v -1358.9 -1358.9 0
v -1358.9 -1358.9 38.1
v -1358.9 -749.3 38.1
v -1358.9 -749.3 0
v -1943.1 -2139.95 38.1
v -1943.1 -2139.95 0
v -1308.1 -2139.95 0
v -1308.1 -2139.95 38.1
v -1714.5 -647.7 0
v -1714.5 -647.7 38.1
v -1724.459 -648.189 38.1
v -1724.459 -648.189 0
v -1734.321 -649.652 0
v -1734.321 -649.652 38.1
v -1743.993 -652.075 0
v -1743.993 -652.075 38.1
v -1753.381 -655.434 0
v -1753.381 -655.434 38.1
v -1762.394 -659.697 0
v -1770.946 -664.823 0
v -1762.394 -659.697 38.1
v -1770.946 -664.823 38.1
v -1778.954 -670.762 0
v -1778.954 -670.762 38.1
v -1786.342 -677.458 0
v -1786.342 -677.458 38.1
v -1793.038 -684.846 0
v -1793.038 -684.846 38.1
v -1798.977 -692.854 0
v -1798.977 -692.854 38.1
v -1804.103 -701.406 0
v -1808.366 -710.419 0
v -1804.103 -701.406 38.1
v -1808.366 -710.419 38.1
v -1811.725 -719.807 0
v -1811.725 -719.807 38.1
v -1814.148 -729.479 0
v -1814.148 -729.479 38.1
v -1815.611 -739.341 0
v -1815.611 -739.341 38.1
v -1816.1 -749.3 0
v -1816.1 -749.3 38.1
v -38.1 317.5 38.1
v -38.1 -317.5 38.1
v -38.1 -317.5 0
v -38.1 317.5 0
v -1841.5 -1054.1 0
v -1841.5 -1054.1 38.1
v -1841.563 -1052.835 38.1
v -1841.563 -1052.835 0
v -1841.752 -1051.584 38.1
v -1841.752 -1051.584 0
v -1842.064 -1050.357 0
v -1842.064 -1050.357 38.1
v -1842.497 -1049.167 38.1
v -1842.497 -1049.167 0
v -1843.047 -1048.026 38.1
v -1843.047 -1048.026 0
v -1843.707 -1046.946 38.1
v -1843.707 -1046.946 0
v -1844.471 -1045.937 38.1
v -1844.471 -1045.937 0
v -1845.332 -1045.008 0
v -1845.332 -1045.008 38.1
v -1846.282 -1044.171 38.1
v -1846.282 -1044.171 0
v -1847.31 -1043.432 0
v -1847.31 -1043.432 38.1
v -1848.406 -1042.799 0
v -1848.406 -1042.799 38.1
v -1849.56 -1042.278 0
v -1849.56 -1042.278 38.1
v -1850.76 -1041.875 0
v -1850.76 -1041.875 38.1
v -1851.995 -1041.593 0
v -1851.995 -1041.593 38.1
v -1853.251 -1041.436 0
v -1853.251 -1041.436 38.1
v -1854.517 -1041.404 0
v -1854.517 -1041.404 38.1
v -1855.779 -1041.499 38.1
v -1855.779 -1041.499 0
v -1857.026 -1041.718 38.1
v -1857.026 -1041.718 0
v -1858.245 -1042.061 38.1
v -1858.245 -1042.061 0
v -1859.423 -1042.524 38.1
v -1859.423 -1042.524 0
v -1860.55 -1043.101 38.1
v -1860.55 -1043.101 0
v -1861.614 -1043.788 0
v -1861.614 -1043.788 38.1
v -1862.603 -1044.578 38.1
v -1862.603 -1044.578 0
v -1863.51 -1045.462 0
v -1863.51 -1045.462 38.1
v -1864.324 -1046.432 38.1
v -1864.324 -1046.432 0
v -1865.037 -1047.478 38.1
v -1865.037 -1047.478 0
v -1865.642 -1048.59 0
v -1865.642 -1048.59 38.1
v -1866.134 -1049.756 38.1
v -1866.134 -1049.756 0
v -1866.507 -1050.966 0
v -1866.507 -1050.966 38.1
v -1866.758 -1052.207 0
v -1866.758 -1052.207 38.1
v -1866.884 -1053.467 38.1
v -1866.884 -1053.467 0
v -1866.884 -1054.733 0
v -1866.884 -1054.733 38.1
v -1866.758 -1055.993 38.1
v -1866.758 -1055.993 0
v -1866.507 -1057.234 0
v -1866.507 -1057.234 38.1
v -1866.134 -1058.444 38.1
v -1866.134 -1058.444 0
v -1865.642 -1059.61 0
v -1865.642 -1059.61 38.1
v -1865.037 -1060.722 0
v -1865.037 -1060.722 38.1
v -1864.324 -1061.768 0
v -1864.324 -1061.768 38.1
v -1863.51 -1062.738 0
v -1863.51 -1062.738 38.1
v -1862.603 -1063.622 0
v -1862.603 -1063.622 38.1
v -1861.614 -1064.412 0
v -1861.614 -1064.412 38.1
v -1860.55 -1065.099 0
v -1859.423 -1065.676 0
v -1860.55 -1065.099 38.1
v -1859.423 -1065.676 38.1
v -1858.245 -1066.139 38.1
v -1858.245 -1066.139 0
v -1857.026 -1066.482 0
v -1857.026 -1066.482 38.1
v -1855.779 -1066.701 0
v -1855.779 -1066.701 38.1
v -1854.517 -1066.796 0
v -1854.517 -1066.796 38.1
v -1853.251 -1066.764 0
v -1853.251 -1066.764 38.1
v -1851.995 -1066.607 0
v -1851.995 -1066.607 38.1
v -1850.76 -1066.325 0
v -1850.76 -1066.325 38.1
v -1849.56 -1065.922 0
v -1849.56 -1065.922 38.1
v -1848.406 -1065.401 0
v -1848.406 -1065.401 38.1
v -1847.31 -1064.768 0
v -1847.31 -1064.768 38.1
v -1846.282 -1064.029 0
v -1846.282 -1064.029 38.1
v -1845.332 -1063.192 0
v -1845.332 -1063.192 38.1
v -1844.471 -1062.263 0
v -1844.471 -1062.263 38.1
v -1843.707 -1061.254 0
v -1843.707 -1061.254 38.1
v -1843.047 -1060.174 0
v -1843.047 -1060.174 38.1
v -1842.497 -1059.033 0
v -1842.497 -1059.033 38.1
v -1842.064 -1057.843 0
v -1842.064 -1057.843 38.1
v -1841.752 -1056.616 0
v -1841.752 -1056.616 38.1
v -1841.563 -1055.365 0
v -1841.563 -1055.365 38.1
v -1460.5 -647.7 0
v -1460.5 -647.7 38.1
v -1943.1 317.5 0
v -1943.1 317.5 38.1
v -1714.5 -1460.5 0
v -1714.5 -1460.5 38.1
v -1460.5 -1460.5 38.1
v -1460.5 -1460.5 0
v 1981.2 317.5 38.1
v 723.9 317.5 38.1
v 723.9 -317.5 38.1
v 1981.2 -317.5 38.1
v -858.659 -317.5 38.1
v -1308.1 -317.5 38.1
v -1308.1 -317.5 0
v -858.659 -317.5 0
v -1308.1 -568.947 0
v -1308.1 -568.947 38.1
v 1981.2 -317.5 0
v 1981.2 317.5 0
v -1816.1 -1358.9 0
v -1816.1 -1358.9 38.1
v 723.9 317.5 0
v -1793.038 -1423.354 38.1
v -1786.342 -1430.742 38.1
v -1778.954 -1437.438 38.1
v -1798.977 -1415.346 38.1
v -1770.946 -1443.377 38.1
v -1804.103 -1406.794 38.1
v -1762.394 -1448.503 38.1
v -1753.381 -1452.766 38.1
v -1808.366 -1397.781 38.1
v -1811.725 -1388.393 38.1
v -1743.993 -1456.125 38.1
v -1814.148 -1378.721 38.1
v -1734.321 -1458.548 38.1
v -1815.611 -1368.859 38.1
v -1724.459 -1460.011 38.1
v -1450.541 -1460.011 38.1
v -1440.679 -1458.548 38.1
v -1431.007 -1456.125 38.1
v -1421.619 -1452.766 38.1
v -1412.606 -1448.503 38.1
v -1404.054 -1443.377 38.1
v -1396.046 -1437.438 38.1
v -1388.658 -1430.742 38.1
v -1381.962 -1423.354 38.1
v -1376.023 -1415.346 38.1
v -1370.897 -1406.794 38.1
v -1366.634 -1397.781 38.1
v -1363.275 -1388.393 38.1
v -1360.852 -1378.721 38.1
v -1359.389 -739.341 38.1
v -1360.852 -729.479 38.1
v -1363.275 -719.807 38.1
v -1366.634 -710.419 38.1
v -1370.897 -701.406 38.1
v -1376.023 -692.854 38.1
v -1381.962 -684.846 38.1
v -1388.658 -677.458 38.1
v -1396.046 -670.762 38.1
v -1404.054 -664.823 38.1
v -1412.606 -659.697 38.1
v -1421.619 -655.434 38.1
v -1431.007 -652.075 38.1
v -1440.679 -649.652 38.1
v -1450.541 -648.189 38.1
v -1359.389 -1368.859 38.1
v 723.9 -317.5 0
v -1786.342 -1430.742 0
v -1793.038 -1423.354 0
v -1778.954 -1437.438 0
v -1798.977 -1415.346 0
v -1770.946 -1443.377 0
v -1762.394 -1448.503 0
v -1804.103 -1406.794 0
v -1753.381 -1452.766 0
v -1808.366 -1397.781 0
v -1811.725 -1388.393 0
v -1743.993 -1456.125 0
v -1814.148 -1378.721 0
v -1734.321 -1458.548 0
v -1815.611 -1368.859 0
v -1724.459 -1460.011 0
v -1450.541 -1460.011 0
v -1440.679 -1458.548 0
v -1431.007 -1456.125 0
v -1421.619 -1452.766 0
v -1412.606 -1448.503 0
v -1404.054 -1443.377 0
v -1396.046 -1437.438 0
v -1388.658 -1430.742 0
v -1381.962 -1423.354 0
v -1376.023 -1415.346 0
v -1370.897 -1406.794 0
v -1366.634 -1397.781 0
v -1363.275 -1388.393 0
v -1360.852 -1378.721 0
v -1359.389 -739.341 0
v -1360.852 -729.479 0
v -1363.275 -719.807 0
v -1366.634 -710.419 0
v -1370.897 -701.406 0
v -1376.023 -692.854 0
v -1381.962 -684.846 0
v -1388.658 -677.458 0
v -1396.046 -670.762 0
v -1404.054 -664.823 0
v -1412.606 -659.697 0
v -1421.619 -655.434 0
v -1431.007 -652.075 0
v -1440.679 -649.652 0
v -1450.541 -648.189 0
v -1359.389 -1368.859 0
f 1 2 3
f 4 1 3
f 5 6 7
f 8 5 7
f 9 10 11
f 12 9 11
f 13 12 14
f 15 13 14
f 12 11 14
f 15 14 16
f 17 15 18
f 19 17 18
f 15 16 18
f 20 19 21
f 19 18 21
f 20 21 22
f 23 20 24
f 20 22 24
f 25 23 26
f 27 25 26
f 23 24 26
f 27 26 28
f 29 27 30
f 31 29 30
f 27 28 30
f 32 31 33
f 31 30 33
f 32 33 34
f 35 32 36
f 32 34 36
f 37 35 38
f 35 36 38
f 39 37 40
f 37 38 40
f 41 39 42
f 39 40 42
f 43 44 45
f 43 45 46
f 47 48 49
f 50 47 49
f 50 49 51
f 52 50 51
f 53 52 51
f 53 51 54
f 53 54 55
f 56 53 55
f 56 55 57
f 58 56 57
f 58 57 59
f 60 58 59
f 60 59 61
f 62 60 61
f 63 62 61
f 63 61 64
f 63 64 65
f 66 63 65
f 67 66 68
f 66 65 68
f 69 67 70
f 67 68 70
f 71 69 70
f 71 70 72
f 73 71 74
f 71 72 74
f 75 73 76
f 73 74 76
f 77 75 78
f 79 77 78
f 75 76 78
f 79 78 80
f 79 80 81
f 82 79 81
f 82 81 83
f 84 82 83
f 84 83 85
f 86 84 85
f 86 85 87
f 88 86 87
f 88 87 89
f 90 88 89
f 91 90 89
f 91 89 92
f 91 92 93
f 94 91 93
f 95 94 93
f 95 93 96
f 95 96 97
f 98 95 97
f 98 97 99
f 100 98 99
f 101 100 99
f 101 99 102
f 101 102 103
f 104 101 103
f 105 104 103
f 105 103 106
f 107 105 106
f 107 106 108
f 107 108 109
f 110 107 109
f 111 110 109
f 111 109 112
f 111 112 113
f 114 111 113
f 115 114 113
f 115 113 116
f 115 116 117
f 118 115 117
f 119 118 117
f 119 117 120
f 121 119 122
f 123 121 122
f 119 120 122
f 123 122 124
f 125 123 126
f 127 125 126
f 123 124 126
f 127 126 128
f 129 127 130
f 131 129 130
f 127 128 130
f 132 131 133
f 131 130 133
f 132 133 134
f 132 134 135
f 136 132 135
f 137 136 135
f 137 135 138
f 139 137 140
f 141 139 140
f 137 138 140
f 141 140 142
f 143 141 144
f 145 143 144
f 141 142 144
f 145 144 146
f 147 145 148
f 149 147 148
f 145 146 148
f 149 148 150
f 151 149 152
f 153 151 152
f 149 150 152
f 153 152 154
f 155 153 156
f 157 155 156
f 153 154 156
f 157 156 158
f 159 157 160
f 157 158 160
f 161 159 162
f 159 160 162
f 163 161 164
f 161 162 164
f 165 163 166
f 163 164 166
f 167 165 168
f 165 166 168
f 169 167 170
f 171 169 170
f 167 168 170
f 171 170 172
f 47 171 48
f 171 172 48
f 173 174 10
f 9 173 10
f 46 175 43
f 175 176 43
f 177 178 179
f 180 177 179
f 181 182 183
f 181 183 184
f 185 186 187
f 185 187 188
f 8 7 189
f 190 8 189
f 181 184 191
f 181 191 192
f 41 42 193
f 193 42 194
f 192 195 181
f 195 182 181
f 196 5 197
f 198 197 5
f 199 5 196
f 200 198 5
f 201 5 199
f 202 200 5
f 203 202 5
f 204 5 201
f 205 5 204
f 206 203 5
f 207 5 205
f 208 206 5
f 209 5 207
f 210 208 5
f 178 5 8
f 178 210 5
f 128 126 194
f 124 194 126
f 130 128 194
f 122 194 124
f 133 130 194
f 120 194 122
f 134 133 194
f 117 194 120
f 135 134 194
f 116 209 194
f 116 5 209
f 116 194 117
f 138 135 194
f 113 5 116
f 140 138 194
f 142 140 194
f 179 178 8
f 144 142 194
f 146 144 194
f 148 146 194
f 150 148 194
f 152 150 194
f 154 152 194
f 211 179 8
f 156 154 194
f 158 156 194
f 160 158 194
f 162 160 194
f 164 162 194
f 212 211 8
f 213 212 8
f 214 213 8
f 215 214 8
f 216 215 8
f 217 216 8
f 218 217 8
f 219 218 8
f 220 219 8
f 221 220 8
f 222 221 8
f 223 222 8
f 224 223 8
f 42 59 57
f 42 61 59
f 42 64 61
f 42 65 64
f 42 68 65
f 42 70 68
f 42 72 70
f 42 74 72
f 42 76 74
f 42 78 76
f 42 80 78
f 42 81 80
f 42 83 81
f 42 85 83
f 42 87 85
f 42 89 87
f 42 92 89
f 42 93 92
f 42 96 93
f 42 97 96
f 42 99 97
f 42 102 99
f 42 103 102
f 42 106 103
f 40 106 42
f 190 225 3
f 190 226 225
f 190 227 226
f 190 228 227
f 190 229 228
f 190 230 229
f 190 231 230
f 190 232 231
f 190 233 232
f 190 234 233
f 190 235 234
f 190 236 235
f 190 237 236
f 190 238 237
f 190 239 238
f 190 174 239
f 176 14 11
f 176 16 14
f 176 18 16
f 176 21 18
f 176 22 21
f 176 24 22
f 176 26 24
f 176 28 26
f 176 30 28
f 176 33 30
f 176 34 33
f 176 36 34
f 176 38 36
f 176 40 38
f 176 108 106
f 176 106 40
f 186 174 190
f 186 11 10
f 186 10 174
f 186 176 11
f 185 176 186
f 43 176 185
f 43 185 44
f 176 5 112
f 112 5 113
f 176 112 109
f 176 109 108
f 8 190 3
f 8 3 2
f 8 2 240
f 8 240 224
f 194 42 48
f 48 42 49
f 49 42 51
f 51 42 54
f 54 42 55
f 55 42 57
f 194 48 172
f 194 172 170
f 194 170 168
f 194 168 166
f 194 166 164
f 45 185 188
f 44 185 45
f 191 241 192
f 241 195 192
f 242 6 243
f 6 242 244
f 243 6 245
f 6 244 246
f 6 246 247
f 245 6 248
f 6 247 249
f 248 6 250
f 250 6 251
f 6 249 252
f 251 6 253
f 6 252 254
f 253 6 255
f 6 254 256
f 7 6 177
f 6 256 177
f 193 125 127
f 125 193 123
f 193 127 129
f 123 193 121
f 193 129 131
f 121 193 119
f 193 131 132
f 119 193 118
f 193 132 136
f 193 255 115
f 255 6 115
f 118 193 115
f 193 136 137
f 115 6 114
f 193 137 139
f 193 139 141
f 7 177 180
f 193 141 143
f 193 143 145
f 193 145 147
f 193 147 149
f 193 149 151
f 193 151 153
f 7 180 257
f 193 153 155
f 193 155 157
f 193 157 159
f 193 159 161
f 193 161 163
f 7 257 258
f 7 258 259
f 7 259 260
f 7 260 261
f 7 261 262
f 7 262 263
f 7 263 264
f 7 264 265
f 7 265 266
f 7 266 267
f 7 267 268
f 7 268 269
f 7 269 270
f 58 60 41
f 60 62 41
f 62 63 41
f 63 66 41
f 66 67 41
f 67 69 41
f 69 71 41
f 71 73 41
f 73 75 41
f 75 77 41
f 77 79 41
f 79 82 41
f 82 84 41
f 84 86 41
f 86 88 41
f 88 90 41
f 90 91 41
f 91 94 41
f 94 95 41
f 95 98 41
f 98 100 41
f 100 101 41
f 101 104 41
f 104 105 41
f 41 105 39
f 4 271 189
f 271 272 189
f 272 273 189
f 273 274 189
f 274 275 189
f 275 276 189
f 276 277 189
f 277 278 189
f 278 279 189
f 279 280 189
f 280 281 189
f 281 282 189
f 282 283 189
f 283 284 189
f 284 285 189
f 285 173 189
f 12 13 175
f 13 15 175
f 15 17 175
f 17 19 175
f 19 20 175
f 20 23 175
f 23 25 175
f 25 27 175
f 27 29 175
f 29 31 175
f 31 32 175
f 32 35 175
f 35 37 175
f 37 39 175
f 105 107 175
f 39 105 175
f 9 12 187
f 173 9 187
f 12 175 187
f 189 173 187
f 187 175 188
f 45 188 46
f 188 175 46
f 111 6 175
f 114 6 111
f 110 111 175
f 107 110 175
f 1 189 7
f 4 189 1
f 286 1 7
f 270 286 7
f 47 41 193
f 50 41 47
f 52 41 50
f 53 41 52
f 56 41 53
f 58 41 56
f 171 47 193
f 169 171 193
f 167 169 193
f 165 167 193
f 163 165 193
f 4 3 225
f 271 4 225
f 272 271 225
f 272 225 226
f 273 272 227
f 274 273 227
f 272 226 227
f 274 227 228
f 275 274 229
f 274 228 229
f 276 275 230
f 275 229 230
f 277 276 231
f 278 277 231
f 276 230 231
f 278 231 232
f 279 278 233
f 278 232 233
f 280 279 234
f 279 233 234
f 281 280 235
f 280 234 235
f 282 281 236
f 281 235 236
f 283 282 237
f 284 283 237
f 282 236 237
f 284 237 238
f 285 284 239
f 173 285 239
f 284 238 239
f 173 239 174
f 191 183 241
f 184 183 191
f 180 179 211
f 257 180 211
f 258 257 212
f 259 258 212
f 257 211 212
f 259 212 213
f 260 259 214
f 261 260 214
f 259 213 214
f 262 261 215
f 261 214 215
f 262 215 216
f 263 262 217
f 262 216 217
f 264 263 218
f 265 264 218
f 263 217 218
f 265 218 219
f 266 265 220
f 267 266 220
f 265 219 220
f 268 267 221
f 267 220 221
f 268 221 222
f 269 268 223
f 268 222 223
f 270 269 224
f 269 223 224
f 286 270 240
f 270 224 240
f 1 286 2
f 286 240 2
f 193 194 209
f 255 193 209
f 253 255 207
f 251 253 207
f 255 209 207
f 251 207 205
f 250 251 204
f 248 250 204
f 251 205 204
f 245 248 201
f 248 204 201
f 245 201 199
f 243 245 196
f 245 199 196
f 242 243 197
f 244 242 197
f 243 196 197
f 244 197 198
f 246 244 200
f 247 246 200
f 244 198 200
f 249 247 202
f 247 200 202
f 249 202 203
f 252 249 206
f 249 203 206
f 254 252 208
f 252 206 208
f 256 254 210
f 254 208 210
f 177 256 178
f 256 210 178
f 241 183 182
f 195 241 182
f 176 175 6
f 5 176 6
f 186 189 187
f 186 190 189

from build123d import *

# Parameters (mm, degrees)
F0_W          = 38.1
F0_H          = 635
F1_DEPTH      = 38.1
F2_DEPTH      = 876.3
F4_W          = 762
F4_H          = 807.183926
F5_DEPTH      = 203.2
F5_DEPTH_BACK = 203.2
F6_R          = 12.7
F7_DEPTH      = 127
F2_FACE_W     = 635
F2_FACE_H     = 876.3
F8_DEPTH      = 127
F9_W          = 449.440837
F9_H          = 659.774303
F10_DEPTH     = 127


with BuildPart() as f1:
    # F0 (on Top) → F1 (new body)
    with BuildSketch(Plane.XY):
        Polygon((1943.1, -317.5), (1943.1, 317.5), (-1943.1, 317.5), (-1943.1, -317.5), (-1308.1, -317.5), (-1056.652829, -317.5), align=None)
        Polygon((-1308.1, -317.5), (-1943.1, -317.5), (-1943.1, -2139.95), (-1308.1, -2139.95), (-1308.1, -568.947171), align=None)
        with Locations((1962.15, 0)):
            Rectangle(F0_W, F0_H)
        Polygon((-1308.1, -568.947171), (-1056.652829, -317.5), (-1308.1, -317.5), align=None)
    extrude(amount=F1_DEPTH)

    # F0 (on Top) → F2 (join)
    with BuildSketch(Plane.XY):
        with Locations((1962.15, 0)):
            Rectangle(F0_W, F0_H)
    extrude(amount=-F2_DEPTH)

    # F4 (on face) → F5 (cut, two sides)
    with BuildSketch(Plane.XY.offset(38.1)) as f5_sk:
        with Locations((342.9, 86.091963)):
            Rectangle(F4_W, F4_H)
    extrude(amount=-F5_DEPTH, mode=Mode.SUBTRACT)
    extrude(f5_sk.sketch, amount=-F5_DEPTH_BACK, mode=Mode.SUBTRACT)

    # F6 (on face) → F7 (cut)
    with BuildSketch(Plane.XY.offset(38.1)):
        with BuildLine():
            ThreePointArc((-1358.9, -749.3), (-1388.657951, -677.457951), (-1460.5, -647.7))
            Line((-1460.5, -647.7), (-1714.5, -647.7))
            ThreePointArc((-1714.5, -647.7), (-1786.342049, -677.457951), (-1816.1, -749.3))
            Line((-1816.1, -749.3), (-1816.1, -1358.9))
            ThreePointArc((-1816.1, -1358.9), (-1786.342049, -1430.742049), (-1714.5, -1460.5))
            Line((-1714.5, -1460.5), (-1460.5, -1460.5))
            ThreePointArc((-1460.5, -1460.5), (-1388.657951, -1430.742049), (-1358.9, -1358.9))
            Line((-1358.9, -1358.9), (-1358.9, -749.3))
        make_face()
        with Locations((-1854.2, -1054.1)):
            Circle(F6_R)
    extrude(amount=-F7_DEPTH, mode=Mode.SUBTRACT)

    # F2_face (on face) → F8 (cut)
    with BuildSketch(Plane(origin=(1943.1, 0, -438.15), x_dir=(0, -1, 0), z_dir=(-1, 0, 0))):
        Rectangle(F2_FACE_W, F2_FACE_H)
    extrude(amount=-F8_DEPTH, mode=Mode.SUBTRACT)

    # F9 (on face) → F10 (cut)
    with BuildSketch(Plane.XY.offset(38.1)):
        with Locations((-1083.379581, -647.387151)):
            Rectangle(F9_W, F9_H)
    extrude(amount=-F10_DEPTH, mode=Mode.SUBTRACT)


solid = f1.part
